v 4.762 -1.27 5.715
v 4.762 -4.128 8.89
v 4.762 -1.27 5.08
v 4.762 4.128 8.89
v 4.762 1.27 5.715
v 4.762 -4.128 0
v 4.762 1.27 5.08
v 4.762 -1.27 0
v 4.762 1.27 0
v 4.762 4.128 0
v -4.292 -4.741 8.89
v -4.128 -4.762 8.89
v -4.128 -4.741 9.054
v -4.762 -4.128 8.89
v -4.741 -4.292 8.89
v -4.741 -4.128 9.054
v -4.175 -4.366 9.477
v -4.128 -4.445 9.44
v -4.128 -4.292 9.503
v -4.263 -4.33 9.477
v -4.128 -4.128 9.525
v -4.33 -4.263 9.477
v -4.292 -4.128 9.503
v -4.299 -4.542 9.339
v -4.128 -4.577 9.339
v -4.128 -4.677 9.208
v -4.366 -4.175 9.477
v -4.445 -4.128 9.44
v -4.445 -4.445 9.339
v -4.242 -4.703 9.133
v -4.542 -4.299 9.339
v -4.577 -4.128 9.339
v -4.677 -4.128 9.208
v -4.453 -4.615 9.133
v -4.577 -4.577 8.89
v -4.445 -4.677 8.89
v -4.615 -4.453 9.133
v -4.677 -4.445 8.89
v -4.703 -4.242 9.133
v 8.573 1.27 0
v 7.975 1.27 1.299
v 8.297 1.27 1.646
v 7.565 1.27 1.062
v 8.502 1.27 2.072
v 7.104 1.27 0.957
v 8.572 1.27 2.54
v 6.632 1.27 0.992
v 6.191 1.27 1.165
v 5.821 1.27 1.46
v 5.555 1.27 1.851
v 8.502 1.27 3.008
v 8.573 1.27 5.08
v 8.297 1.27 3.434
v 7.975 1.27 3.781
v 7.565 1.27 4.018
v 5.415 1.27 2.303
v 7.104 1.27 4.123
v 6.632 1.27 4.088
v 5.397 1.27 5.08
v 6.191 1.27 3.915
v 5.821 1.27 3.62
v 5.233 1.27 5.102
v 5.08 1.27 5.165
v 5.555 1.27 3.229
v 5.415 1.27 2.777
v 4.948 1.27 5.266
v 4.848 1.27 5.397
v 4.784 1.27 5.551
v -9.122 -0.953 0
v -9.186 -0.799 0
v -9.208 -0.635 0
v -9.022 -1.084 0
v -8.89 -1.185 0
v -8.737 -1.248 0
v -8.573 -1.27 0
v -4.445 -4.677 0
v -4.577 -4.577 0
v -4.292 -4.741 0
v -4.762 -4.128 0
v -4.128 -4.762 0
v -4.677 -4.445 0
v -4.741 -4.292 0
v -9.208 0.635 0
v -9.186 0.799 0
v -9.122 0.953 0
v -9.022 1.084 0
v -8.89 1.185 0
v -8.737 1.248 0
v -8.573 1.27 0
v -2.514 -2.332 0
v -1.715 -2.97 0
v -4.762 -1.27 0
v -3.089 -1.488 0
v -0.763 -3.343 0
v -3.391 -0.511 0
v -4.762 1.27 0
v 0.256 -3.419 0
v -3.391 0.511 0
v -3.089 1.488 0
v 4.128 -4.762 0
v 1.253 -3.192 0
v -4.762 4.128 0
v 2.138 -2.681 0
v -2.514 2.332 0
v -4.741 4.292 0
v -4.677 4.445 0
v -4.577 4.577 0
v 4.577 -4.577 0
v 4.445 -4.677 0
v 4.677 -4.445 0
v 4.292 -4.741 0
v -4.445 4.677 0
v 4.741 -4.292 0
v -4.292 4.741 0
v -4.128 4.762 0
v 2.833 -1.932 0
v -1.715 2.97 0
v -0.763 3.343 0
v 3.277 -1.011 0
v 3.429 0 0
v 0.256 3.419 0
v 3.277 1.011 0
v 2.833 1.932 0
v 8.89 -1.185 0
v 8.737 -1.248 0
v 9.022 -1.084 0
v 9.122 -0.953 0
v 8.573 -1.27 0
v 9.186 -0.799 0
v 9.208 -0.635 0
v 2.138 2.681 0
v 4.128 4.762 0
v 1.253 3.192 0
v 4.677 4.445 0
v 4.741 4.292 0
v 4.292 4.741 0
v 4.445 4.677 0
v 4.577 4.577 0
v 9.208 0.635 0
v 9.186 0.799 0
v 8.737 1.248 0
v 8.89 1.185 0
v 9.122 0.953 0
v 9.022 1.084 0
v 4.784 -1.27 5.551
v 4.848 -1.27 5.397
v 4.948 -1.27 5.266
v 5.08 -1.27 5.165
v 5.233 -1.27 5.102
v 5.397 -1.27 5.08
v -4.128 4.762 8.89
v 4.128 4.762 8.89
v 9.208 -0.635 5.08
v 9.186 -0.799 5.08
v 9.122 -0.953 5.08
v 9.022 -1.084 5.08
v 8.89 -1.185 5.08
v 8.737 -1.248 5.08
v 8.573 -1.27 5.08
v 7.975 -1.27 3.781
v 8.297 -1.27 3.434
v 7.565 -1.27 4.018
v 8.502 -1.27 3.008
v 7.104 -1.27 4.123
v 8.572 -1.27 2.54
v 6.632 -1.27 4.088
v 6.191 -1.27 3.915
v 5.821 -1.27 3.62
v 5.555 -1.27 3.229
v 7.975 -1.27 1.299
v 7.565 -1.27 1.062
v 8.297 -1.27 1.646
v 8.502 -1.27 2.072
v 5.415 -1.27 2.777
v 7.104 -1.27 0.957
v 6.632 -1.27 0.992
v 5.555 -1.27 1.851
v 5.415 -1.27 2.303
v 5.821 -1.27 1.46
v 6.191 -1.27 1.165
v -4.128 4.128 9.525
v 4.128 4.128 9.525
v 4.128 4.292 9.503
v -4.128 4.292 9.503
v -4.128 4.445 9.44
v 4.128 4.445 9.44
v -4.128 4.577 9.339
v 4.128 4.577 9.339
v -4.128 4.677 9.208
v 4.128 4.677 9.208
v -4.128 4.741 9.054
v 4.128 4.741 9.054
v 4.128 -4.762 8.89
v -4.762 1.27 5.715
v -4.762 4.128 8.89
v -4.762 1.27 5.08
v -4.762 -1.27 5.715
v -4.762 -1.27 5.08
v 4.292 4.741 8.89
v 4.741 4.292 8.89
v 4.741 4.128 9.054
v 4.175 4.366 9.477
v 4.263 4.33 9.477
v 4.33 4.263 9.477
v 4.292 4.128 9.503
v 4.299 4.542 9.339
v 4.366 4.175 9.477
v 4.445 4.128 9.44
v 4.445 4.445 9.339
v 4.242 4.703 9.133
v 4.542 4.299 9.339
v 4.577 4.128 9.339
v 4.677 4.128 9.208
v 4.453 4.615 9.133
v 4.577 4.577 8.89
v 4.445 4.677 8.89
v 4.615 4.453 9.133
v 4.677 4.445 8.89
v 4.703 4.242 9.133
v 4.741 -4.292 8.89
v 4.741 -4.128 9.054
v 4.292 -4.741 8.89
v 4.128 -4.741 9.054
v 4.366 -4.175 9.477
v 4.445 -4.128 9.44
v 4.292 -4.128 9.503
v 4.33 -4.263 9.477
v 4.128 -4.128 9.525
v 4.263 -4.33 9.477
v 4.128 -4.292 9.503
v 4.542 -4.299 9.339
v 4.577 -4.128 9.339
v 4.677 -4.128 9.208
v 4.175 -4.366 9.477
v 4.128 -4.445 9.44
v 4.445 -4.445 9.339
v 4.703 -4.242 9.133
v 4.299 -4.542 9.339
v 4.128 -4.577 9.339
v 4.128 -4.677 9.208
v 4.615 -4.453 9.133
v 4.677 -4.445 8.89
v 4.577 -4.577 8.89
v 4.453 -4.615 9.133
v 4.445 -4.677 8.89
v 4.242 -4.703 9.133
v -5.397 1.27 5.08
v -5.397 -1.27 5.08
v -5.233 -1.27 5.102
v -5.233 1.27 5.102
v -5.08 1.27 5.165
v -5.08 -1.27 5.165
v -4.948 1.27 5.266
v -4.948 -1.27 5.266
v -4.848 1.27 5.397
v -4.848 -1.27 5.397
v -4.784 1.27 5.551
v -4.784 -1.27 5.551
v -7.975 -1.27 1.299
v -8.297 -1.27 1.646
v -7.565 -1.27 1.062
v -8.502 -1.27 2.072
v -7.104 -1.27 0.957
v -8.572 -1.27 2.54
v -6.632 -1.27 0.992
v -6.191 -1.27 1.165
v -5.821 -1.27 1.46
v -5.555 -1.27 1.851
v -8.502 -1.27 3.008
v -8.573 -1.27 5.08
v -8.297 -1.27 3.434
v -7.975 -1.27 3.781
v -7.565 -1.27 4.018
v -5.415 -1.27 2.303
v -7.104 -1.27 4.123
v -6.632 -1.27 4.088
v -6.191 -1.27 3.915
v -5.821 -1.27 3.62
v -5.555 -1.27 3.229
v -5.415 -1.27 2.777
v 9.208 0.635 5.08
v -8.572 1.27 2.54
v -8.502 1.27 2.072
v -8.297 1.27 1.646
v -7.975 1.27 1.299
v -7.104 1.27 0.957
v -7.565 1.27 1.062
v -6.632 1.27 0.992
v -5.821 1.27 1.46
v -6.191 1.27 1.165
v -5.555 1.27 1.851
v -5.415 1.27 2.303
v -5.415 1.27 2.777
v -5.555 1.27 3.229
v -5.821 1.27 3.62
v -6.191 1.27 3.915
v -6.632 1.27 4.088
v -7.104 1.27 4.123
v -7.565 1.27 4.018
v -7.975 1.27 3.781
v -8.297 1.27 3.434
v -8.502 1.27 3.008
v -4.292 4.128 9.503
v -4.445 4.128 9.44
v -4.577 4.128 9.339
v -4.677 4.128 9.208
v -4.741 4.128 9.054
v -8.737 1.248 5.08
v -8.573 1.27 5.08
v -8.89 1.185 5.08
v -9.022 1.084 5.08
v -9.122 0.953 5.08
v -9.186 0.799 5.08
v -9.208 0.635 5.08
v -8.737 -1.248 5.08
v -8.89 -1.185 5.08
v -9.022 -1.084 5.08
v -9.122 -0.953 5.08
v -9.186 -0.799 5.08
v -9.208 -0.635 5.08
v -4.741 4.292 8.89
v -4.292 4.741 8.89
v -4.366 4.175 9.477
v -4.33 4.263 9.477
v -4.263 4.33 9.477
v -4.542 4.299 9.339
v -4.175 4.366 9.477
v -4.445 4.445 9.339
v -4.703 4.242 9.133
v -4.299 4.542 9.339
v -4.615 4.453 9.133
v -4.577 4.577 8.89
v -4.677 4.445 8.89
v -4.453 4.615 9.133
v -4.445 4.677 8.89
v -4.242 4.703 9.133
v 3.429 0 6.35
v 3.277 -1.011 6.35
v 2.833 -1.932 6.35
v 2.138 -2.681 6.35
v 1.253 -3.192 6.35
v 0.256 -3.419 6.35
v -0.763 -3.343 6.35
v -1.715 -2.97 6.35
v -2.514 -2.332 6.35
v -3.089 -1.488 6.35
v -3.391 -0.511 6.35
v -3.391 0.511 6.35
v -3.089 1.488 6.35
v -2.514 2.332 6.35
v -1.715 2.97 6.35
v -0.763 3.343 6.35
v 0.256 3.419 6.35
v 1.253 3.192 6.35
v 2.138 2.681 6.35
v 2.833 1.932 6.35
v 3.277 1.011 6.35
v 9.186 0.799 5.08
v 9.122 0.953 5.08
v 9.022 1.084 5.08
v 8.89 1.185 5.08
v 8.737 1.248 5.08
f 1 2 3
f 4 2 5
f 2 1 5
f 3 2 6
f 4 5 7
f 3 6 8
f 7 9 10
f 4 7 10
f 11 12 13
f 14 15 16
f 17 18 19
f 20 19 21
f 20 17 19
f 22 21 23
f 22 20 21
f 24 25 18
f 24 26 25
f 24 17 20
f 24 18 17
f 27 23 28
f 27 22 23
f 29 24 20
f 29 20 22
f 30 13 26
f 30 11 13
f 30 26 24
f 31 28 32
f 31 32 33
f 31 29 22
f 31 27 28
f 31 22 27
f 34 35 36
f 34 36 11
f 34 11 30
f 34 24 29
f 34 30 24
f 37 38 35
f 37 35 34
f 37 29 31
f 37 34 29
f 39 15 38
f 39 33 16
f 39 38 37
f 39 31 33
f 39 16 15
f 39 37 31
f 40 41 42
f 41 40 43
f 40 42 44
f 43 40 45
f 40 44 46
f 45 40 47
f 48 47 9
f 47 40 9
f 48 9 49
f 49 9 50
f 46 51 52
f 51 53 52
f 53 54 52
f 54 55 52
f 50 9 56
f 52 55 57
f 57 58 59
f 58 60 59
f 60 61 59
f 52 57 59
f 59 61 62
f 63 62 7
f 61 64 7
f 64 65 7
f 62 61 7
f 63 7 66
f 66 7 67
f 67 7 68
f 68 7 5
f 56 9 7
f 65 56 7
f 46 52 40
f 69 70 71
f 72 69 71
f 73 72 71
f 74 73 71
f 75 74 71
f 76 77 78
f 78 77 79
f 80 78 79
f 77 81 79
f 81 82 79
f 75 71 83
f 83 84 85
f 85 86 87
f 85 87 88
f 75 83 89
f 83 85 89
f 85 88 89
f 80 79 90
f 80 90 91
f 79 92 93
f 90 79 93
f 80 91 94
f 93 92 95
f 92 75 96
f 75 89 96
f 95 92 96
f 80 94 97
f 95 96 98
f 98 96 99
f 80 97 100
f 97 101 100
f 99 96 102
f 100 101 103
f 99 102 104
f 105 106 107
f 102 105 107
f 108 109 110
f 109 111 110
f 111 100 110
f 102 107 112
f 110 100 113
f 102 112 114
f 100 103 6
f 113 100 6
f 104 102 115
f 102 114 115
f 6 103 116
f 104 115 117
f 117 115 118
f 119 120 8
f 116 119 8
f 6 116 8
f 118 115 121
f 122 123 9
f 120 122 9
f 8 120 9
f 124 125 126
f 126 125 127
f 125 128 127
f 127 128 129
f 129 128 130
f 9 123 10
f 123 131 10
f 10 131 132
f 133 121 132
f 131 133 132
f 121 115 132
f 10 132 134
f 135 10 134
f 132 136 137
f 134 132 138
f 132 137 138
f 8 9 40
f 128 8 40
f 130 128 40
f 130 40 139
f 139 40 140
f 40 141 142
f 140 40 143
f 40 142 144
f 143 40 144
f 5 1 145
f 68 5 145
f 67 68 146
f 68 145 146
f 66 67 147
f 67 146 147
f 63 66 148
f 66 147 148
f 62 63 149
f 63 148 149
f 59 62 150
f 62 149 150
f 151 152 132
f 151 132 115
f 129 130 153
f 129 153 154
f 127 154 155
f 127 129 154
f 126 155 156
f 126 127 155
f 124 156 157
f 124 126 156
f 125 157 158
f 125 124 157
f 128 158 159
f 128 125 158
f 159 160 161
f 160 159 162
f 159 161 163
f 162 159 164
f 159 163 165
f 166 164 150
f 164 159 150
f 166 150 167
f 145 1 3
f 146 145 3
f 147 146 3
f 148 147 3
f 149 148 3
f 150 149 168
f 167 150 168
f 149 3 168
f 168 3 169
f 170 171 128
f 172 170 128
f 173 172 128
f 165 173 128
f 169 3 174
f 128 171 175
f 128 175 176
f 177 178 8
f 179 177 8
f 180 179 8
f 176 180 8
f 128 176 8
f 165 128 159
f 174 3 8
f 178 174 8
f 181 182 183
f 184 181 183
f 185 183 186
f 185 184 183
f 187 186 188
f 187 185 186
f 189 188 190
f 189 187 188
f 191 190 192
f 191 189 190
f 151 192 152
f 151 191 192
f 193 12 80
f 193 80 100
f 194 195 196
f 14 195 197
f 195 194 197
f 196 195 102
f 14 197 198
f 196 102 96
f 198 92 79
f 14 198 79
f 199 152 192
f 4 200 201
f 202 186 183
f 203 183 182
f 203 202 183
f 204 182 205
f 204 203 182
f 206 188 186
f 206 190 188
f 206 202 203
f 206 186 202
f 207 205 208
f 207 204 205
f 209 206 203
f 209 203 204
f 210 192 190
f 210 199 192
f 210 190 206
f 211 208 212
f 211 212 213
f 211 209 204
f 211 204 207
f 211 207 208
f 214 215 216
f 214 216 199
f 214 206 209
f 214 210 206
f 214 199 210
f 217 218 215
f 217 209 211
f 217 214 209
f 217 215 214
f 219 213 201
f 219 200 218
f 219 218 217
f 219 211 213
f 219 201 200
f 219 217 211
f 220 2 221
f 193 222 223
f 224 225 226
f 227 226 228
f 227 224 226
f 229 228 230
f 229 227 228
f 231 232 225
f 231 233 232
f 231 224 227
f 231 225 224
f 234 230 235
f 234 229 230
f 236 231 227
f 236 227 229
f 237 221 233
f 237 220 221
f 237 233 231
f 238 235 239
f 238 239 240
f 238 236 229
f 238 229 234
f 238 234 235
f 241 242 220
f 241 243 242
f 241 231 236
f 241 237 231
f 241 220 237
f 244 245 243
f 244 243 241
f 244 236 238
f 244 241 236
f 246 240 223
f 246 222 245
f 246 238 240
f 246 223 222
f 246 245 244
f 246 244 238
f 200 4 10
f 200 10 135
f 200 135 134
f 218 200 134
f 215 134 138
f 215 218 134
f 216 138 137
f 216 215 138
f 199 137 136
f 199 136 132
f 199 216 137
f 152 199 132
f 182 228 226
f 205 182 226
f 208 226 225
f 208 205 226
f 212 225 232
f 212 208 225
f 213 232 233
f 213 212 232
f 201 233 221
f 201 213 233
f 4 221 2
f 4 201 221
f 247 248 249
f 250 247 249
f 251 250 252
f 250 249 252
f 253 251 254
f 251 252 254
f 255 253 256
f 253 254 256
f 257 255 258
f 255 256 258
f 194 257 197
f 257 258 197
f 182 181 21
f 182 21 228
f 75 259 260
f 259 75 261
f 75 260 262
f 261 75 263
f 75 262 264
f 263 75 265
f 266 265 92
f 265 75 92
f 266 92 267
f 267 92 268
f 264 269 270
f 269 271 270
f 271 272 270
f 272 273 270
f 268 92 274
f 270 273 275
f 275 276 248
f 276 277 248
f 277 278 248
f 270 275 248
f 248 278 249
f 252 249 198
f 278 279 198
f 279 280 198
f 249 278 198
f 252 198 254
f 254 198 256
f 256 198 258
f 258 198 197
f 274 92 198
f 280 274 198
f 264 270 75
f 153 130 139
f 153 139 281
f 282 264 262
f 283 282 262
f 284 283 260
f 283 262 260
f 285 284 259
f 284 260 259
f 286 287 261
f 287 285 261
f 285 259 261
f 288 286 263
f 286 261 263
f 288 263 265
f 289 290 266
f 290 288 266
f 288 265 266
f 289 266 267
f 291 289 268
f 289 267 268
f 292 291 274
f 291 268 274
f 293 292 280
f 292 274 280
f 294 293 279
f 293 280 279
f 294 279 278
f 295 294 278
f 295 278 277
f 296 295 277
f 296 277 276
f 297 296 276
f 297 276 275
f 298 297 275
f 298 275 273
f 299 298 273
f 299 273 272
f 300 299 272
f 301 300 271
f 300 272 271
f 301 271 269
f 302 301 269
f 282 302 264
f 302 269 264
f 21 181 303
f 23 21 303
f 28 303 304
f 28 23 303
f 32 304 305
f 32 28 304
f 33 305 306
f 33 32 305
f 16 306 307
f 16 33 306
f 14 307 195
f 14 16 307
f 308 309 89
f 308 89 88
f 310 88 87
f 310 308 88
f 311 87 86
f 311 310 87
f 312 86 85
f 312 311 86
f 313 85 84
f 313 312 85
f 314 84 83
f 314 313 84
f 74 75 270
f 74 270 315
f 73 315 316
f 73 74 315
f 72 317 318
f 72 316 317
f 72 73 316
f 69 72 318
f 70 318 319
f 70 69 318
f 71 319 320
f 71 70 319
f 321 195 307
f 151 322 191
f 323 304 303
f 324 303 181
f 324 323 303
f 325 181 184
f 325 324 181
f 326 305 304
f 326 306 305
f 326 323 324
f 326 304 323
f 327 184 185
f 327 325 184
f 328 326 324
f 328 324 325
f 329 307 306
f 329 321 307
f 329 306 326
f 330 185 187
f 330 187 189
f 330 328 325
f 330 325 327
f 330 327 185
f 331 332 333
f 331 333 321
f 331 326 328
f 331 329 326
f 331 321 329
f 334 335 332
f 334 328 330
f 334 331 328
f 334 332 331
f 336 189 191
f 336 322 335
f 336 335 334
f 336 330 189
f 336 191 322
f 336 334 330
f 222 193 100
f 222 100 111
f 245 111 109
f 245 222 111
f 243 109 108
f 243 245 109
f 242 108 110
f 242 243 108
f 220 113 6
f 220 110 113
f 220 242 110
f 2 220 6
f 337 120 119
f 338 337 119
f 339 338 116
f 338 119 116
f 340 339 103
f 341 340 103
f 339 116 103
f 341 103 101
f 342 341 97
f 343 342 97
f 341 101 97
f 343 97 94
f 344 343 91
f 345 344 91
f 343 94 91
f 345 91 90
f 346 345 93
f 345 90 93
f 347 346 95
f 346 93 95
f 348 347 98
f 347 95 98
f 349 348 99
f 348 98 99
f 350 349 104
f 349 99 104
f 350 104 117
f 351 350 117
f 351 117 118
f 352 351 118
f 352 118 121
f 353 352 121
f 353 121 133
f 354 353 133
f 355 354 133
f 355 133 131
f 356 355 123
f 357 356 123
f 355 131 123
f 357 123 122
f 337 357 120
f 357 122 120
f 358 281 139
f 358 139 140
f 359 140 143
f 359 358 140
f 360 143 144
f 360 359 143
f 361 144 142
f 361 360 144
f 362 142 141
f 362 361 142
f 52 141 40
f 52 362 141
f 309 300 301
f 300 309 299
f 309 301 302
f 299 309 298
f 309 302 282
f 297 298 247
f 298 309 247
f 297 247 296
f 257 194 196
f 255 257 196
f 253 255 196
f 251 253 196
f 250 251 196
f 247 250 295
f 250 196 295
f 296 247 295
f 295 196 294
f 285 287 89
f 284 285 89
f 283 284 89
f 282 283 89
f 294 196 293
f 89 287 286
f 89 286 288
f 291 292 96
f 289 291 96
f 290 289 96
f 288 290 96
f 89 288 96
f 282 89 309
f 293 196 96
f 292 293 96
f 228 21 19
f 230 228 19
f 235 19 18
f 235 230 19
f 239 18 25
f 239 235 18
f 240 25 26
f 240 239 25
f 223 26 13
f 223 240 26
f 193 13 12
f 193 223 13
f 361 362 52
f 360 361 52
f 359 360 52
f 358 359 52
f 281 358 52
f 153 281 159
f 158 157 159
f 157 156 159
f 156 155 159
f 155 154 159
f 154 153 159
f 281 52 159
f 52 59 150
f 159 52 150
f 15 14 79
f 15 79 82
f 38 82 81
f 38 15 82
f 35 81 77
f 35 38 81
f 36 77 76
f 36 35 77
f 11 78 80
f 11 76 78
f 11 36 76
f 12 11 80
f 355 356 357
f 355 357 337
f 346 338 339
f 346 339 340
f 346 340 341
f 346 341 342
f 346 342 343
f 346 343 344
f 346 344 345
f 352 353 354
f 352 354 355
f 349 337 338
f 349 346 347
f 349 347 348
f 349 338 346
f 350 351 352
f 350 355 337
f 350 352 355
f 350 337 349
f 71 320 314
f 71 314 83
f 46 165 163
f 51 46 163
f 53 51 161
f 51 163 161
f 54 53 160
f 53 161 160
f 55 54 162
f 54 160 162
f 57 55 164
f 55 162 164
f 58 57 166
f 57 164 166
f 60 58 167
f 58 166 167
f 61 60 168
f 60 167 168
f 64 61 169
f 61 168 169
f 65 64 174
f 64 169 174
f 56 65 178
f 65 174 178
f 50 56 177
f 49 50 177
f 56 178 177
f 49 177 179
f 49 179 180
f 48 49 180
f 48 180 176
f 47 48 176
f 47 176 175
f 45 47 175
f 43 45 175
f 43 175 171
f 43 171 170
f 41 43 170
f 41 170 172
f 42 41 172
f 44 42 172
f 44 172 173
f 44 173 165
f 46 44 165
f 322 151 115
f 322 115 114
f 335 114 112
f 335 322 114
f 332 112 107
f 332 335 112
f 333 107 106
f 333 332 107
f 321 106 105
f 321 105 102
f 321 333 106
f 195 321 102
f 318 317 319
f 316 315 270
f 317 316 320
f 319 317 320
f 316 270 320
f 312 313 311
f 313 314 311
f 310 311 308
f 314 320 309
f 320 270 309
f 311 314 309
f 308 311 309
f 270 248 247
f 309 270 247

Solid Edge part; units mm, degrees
sketch "Sketch1" plane through (0, 0, 0) normal (0, 0, 1) x (1, 0, 0)
  line L0 (4.7625, -4.7625) -> (4.7625, 4.7625)
  line L1 (4.7625, 4.7625) -> (-4.7625, 4.7625)
  line L2 (-4.7625, 4.7625) -> (-4.7625, -4.7625)
  line L3 (-4.7625, -4.7625) -> (4.7625, -4.7625)
extrude "Protrusion1" add sketch "Sketch1" along normal blind 9.525
sketch "Sketch2" plane through (0, 0, 0) normal (0, 0, -1) x (1, 0, 0)
  circle A0 centre (0, 0) radius 3.429
extrude "ExtrudedCutout_1" cut sketch "Sketch2" against normal blind 6.35
sketch "Sketch3" plane through (4.7625, 0, 4.7625) normal (1, 0, 0) x (0, 1, 0)
  line L0 (-1.27, 0.3175) -> (-1.27, -4.7625)
  line L1 (-1.27, -4.7625) -> (0, -4.7625)
  line L2 (0, -4.7625) -> (1.27, -4.7625)
  line L3 (1.27, -4.7625) -> (1.27, 0.3175)
  line L4 (1.27, 0.3175) -> (-1.27, 0.3175)
extrude "ExtrudedProtrusion_3" add sketch "Sketch3" along normal blind 4.445
sketch "Sketch4" plane through (6.985, -1.27, 2.54) normal (0, -1, 0) x (1, 0, 0)
  circle A0 centre (0, 0) radius 1.5875
extrude "Cutout1" cut sketch "Sketch4" against normal up to vertex (2.54 mm away)
mirror "Mirror1" about plane through (0, 0, 0) normal (1, 0, 0) of "ExtrudedProtrusion_3", "Cutout1"
fillet "Round_1" radius 0.635 14 edges at (4.7625, -4.7625, 4.7625) (4.7625, 4.7625, 4.7625) (-4.7625, -4.7625, 4.7625) (-4.7625, 4.7625, 4.7625) (9.2075, 1.27, 2.54) (9.2075, -1.27, 2.54) (-9.2075, 1.27, 2.54) (-9.2075, -1.27, 2.54) (4.7625, 0, 5.08) (-4.7625, 0, 5.08) (4.7625, 0, 9.525) (0, 4.7625, 9.525) (-4.7625, 0, 9.525) (0, -4.7625, 9.525)
properties material "ABS Plastic, medium impact"
